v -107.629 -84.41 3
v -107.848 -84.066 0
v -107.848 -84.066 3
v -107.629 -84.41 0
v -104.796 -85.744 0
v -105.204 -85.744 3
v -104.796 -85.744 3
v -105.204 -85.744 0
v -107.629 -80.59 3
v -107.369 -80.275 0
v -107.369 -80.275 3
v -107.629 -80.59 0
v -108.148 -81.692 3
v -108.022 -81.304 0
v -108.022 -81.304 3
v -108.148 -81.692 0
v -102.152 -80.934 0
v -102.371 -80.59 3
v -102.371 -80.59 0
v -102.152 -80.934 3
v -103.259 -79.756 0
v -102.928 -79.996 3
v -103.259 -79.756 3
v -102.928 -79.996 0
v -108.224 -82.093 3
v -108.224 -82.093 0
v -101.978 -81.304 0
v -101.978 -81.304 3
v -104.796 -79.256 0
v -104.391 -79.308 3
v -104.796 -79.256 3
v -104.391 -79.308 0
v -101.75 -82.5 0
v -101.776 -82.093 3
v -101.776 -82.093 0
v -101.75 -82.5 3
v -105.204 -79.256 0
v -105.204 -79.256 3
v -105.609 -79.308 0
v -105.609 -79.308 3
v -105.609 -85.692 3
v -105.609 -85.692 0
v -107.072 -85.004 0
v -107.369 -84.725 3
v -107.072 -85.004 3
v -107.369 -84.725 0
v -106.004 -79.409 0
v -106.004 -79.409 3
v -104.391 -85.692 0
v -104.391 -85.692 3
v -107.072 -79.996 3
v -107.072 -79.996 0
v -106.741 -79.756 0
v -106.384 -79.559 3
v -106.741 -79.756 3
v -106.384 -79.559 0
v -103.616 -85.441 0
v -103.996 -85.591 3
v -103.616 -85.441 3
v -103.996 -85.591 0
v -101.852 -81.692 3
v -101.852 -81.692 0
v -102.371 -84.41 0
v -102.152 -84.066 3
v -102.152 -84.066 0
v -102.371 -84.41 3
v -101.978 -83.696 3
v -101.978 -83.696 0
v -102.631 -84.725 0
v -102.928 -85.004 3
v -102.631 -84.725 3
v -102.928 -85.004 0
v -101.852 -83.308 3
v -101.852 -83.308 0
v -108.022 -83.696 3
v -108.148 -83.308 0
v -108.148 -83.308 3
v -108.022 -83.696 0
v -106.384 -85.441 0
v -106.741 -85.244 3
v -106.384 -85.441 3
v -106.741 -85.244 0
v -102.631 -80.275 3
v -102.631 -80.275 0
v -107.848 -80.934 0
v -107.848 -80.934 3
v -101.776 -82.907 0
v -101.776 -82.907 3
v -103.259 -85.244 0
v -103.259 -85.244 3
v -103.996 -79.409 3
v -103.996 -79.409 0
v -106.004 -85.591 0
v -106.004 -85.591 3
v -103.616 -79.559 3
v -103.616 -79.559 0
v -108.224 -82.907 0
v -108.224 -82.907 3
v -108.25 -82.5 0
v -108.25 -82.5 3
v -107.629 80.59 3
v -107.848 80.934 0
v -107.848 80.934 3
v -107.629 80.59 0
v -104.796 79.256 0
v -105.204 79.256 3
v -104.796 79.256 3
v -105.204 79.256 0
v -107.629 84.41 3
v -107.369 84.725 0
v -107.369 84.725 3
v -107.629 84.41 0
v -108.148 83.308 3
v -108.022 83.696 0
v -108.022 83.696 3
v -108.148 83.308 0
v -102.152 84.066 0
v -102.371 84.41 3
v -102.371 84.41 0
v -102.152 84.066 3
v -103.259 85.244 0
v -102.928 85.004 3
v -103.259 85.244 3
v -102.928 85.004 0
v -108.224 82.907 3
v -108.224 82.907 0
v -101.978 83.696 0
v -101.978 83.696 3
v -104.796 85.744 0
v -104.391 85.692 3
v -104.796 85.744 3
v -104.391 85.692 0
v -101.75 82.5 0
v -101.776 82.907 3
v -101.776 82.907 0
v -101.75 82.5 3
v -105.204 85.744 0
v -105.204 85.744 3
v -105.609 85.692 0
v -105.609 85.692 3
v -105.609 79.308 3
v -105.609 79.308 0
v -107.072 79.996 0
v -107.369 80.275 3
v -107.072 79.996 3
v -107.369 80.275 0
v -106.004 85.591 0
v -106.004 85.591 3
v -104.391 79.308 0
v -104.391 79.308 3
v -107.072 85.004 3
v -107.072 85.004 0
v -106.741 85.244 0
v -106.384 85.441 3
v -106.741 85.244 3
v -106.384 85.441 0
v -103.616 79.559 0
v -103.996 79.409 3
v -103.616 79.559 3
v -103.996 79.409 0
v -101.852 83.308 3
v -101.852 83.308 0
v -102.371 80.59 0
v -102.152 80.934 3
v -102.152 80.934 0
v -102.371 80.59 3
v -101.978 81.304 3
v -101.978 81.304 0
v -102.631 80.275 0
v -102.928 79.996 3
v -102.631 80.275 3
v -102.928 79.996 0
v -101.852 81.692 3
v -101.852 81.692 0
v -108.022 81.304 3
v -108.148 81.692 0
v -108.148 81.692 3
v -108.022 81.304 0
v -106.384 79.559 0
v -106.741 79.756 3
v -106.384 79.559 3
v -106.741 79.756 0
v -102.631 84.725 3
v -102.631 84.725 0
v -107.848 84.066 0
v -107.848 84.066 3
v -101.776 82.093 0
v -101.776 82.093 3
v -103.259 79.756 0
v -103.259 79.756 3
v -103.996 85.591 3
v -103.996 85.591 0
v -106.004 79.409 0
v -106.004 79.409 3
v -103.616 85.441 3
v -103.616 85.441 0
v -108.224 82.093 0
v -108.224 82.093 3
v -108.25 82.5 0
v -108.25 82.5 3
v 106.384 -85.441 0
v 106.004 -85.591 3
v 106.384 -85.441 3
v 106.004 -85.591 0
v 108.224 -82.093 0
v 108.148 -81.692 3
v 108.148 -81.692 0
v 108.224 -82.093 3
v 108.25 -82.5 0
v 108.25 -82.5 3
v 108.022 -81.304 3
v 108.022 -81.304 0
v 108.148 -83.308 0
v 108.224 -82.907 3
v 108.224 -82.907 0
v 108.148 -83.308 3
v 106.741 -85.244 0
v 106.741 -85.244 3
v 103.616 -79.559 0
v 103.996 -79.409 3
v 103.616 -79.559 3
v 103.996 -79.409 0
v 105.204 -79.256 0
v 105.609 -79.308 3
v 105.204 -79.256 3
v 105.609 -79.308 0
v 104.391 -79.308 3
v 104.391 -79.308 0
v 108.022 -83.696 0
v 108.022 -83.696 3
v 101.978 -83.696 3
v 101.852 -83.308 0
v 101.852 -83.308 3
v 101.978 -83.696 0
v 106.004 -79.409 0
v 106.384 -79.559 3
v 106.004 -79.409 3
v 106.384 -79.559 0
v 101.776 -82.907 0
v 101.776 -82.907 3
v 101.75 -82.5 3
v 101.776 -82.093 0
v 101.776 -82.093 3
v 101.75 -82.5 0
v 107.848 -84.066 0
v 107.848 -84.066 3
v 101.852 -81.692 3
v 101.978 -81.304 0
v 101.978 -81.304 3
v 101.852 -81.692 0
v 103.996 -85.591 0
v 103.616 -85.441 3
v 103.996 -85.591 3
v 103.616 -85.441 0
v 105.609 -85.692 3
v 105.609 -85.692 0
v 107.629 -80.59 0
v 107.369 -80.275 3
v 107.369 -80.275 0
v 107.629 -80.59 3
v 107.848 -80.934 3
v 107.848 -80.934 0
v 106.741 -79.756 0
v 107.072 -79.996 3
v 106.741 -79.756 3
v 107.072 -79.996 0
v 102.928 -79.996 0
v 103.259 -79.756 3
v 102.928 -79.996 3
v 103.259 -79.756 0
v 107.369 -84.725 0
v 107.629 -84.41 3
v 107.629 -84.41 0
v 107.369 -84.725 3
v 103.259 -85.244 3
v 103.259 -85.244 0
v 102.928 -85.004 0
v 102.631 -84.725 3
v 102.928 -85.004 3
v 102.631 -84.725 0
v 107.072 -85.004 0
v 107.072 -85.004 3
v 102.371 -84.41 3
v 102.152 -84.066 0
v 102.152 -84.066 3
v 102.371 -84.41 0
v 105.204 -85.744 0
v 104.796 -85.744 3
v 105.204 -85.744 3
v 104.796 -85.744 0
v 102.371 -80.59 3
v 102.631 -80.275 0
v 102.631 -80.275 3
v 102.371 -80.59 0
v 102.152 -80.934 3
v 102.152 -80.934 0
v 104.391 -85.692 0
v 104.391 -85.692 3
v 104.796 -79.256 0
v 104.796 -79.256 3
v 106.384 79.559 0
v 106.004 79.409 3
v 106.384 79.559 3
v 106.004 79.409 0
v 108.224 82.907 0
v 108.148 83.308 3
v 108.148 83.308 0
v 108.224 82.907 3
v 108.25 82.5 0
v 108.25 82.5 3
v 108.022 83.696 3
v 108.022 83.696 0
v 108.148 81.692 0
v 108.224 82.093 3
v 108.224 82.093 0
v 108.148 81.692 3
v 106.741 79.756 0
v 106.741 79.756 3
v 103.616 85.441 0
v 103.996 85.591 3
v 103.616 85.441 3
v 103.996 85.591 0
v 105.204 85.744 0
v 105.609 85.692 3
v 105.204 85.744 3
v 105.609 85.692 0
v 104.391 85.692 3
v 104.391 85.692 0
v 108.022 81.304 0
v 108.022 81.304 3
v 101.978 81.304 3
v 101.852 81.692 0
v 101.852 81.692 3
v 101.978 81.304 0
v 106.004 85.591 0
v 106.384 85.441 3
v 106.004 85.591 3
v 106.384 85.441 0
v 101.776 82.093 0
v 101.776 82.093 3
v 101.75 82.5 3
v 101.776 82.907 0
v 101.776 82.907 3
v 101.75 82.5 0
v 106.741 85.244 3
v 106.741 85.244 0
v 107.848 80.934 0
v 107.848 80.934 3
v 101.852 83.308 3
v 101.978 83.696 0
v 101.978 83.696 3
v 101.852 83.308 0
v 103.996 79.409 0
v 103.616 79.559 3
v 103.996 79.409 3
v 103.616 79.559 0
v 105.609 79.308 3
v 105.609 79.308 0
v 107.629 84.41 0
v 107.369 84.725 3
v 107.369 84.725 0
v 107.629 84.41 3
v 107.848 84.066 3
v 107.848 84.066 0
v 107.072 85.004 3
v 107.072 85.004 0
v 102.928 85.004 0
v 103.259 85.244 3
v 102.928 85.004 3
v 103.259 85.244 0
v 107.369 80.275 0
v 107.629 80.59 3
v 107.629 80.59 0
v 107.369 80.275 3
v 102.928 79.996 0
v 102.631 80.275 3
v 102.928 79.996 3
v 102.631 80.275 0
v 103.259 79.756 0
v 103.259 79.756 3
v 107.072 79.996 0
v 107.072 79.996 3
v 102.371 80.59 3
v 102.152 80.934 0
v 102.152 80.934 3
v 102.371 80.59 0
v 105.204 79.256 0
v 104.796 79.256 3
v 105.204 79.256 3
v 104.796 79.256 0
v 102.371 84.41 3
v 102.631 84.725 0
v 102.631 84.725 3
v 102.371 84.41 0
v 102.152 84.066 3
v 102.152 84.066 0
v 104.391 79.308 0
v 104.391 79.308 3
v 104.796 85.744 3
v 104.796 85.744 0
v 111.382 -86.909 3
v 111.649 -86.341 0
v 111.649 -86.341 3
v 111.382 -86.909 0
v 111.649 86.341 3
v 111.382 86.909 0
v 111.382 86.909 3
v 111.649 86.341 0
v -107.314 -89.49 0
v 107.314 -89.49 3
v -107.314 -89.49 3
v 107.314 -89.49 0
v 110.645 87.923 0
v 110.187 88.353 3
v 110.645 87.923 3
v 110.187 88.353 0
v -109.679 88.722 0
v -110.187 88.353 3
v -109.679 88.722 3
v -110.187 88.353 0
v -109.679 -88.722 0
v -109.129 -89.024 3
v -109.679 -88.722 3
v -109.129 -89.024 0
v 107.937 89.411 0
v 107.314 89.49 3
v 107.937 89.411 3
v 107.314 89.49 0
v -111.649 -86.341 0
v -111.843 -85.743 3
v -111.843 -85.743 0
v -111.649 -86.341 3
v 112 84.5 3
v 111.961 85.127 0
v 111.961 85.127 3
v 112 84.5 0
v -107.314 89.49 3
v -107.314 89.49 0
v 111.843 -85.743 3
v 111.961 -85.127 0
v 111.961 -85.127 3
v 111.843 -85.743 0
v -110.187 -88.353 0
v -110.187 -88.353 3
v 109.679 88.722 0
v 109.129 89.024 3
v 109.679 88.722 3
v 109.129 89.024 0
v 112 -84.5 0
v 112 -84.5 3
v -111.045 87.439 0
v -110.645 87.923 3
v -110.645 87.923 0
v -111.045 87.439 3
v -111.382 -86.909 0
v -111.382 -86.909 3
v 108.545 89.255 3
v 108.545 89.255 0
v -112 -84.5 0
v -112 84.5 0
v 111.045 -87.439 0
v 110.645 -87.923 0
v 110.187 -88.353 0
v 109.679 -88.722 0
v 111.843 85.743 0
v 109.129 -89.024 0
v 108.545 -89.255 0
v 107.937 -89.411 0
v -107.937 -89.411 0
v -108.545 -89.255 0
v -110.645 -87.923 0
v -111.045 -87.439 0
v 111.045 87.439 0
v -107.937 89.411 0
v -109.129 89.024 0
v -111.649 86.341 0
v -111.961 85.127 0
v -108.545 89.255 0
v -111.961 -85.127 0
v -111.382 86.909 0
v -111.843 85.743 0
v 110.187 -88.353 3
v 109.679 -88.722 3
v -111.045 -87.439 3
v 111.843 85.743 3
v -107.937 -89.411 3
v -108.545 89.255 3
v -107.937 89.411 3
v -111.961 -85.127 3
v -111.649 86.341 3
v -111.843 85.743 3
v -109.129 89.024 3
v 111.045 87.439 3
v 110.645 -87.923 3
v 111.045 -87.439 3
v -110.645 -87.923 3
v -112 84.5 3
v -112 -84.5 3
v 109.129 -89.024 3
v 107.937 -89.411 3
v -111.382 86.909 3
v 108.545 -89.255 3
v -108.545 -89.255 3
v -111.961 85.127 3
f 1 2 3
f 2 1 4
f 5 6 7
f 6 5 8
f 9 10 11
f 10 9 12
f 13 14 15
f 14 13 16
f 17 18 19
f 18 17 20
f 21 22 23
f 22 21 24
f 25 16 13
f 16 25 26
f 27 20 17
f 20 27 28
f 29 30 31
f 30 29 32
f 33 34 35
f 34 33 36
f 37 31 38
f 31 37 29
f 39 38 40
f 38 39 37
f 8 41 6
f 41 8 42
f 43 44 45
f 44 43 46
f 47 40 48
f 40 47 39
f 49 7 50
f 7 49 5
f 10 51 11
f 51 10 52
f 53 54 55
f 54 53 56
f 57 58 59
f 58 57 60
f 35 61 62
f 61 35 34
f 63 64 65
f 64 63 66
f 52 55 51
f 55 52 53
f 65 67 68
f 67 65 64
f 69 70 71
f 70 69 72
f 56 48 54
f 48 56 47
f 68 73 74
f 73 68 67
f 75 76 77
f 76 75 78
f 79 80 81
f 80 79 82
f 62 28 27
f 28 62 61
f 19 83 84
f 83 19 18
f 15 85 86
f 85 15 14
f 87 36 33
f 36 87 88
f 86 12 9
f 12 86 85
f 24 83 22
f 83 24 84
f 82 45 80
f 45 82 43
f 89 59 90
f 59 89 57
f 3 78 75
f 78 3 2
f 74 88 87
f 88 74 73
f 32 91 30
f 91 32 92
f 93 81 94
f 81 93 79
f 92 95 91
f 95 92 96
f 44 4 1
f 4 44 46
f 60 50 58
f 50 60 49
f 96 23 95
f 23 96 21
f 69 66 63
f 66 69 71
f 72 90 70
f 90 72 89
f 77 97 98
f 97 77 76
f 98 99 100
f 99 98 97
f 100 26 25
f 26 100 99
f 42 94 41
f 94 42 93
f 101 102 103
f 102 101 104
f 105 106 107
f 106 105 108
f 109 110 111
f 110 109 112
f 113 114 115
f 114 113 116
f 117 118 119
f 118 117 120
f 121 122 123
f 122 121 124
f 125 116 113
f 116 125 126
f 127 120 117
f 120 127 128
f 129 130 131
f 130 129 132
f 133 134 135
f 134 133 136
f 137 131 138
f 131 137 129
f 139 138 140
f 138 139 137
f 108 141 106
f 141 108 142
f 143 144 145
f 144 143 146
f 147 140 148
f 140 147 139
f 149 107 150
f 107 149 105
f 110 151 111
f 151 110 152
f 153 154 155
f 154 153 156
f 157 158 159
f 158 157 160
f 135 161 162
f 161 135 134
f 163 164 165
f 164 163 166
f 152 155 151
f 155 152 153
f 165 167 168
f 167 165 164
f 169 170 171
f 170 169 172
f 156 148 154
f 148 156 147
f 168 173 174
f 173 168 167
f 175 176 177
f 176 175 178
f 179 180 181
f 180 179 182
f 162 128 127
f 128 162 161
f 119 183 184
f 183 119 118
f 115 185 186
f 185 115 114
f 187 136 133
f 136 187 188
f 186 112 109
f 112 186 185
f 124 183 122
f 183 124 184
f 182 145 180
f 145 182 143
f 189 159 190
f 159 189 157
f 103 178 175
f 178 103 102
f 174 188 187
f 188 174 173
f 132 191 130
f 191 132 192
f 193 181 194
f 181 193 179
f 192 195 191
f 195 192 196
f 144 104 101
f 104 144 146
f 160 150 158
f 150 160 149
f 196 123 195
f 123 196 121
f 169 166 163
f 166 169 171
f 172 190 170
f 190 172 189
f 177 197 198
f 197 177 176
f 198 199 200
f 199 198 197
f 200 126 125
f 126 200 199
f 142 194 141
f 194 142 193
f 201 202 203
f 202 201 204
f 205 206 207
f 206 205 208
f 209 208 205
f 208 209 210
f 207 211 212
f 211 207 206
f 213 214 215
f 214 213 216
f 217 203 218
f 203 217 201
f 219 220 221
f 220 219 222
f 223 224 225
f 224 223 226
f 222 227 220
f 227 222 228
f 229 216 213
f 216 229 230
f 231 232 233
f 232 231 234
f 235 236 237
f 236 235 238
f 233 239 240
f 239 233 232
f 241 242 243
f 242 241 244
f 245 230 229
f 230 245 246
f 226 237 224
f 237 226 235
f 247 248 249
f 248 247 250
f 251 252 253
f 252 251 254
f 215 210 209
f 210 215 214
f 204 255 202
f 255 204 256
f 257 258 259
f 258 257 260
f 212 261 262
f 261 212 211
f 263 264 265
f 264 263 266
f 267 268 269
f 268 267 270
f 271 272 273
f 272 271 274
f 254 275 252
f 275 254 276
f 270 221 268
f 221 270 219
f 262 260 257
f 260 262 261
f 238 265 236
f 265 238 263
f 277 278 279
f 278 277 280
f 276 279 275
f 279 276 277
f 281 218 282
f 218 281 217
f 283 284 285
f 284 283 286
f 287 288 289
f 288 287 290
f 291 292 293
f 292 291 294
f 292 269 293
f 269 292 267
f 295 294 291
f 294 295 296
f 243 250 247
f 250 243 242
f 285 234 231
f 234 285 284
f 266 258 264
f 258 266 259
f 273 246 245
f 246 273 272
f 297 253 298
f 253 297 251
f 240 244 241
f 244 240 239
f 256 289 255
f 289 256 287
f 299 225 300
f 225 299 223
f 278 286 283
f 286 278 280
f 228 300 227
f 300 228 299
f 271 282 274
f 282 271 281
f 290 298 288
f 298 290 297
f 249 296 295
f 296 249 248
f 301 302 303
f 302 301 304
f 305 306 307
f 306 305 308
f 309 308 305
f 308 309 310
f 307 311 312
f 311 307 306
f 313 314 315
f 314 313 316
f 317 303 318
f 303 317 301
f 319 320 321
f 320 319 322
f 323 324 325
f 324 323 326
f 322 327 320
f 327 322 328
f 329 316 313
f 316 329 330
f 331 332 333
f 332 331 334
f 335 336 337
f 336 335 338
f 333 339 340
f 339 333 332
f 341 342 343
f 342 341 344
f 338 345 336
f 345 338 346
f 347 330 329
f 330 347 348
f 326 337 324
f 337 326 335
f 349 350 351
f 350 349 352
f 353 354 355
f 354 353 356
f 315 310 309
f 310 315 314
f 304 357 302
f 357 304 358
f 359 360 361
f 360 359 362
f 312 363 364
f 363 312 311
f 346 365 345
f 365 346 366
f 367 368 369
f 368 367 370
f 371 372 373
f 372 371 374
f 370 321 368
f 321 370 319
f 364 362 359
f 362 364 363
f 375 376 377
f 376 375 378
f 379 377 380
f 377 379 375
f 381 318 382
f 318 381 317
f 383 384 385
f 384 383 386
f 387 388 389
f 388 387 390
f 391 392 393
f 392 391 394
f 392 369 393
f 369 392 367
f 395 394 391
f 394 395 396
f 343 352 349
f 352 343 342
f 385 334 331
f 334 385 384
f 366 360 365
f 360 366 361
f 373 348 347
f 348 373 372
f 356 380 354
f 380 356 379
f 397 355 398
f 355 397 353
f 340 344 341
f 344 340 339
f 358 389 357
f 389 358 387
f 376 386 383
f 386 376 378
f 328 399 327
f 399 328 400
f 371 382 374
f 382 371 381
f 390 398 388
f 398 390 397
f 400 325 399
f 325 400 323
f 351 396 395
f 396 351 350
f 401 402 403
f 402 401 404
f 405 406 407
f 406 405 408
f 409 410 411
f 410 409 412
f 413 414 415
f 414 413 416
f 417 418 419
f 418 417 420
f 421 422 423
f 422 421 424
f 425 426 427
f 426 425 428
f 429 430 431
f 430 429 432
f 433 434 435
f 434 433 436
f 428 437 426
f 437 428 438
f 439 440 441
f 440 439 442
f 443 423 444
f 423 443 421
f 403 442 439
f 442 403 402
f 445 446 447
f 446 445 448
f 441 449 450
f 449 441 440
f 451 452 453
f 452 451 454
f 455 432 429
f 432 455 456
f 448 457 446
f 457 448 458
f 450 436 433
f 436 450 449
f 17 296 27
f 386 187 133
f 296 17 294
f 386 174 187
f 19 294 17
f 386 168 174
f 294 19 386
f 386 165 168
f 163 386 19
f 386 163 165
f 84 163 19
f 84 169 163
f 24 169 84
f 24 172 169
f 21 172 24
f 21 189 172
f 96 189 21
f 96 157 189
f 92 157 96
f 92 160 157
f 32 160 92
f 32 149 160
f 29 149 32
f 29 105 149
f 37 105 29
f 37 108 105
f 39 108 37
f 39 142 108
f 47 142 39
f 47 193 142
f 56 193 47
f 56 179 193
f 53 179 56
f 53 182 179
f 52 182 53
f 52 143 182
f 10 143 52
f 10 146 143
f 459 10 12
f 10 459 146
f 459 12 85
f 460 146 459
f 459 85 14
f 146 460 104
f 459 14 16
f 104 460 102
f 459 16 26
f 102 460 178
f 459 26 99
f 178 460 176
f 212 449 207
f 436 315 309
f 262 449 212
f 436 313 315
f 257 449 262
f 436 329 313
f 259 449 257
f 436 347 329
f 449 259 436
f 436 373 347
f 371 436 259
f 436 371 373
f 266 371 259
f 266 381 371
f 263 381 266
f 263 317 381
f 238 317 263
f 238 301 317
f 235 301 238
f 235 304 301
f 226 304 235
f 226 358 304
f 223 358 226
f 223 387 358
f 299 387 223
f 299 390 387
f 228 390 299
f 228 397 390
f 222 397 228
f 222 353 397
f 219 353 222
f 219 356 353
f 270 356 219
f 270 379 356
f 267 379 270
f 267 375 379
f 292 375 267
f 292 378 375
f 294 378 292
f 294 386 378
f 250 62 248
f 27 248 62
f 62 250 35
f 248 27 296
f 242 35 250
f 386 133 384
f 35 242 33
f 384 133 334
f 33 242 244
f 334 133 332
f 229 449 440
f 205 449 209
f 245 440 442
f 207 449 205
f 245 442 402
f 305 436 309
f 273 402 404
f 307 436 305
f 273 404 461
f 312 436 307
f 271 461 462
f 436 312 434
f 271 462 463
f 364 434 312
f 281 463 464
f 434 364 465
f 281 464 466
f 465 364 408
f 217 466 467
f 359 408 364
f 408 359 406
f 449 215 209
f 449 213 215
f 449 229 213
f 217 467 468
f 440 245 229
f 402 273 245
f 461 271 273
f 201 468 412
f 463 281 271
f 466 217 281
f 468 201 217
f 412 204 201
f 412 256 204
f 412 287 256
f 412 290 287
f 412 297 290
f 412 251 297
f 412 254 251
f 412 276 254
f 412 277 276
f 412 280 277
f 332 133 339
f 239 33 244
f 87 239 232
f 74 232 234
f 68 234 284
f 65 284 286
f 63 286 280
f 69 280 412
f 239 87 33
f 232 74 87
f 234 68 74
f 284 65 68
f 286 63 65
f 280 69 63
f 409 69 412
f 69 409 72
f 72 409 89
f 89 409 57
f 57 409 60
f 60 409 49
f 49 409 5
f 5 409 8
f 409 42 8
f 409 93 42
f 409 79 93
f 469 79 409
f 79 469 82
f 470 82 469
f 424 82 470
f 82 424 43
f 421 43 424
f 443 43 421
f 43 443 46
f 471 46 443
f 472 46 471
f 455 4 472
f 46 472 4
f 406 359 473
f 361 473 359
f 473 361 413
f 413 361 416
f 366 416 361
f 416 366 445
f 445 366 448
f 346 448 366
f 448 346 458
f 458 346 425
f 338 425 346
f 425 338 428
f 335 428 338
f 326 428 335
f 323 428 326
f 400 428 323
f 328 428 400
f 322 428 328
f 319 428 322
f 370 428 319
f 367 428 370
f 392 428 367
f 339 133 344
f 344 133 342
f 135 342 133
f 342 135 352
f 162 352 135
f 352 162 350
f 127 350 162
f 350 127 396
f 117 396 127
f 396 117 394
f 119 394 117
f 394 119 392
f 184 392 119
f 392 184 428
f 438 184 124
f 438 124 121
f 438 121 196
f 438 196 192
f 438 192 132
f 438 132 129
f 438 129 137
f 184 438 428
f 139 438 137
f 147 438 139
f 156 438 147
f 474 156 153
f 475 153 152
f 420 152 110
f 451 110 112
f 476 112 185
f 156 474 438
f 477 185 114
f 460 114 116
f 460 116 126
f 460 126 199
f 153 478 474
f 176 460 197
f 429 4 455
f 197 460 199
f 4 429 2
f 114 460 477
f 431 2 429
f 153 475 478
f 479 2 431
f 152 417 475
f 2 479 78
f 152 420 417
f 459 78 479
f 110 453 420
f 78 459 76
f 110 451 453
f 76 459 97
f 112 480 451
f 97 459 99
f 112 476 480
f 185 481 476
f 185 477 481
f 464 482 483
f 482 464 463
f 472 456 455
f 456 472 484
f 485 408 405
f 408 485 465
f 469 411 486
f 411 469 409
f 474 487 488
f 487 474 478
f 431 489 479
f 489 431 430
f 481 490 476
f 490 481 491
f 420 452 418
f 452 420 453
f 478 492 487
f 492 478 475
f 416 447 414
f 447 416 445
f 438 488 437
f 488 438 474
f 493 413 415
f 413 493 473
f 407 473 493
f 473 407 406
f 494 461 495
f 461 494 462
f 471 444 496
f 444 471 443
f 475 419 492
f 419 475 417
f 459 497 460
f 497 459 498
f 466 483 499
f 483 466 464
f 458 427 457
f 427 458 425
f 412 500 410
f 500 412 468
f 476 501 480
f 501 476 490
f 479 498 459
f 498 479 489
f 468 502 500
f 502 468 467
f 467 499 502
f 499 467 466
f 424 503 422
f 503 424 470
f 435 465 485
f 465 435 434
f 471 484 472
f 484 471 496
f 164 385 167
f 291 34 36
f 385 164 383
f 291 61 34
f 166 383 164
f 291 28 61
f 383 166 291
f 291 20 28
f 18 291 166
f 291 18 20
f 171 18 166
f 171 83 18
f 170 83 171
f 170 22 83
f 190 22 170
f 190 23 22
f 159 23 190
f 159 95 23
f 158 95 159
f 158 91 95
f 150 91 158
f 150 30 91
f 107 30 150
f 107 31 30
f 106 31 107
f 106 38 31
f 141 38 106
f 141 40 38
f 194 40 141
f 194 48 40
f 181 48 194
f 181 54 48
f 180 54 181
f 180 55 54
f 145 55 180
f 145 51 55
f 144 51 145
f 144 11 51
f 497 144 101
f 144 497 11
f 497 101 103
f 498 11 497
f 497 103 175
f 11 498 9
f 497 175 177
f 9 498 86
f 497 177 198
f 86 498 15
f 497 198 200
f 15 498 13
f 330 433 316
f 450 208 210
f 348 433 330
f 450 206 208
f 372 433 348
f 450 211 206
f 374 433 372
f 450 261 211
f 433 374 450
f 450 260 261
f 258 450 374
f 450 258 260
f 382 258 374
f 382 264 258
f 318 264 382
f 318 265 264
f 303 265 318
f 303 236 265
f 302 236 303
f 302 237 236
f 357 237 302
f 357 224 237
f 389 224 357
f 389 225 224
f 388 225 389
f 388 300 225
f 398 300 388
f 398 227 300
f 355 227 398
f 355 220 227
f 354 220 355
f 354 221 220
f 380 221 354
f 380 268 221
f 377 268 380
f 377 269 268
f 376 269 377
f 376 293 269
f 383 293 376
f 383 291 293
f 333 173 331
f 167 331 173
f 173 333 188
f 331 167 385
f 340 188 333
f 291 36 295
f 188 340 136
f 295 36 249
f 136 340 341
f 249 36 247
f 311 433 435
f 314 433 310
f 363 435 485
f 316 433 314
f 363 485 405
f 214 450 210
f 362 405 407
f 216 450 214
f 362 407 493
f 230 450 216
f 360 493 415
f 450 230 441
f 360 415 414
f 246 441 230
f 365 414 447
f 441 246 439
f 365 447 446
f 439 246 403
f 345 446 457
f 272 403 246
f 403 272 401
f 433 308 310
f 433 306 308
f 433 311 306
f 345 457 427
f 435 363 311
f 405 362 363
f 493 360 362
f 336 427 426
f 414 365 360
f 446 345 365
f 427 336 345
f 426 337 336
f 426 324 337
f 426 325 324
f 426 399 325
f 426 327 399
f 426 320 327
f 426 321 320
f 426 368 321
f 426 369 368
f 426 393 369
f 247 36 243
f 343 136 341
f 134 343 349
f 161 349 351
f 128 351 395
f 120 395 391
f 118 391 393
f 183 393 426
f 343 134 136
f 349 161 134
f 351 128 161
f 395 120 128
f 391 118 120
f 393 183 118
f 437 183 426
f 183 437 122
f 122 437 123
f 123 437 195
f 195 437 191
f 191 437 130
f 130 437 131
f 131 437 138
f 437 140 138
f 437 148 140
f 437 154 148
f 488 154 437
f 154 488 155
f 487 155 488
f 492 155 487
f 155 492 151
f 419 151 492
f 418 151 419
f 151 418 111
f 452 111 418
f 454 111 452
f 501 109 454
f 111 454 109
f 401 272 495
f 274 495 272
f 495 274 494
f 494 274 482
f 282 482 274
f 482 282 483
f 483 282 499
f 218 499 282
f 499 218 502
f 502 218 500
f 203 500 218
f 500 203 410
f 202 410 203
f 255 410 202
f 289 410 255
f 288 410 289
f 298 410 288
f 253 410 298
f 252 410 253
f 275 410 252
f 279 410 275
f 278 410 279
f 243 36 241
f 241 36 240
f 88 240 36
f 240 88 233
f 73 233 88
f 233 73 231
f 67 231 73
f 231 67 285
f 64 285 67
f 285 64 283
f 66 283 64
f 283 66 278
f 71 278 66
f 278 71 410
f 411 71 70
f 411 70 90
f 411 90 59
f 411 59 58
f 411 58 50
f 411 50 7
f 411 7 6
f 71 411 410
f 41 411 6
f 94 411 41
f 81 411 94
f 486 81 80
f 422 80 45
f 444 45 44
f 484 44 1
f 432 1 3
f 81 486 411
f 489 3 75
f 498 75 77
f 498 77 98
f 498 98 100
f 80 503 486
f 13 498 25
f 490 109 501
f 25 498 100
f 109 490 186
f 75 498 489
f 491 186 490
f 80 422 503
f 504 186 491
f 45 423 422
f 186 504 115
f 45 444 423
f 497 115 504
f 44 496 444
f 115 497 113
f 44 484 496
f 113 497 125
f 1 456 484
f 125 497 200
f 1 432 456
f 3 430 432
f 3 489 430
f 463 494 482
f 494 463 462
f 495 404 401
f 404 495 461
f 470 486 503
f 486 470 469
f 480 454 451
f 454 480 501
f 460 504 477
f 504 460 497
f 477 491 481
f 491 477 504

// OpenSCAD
$fn = 50;


difference() {
	union() {
		hull() {
			translate(v = [-107.0000000000, 84.5000000000, 0]) {
				cylinder(h = 3, r = 5);
			}
			translate(v = [107.0000000000, 84.5000000000, 0]) {
				cylinder(h = 3, r = 5);
			}
			translate(v = [-107.0000000000, -84.5000000000, 0]) {
				cylinder(h = 3, r = 5);
			}
			translate(v = [107.0000000000, -84.5000000000, 0]) {
				cylinder(h = 3, r = 5);
			}
		}
	}
	union() {
		translate(v = [-105.0000000000, -82.5000000000, -100.0000000000]) {
			cylinder(h = 200, r = 3.2500000000);
		}
		translate(v = [-105.0000000000, 82.5000000000, -100.0000000000]) {
			cylinder(h = 200, r = 3.2500000000);
		}
		translate(v = [105.0000000000, -82.5000000000, -100.0000000000]) {
			cylinder(h = 200, r = 3.2500000000);
		}
		translate(v = [105.0000000000, 82.5000000000, -100.0000000000]) {
			cylinder(h = 200, r = 3.2500000000);
		}
	}
}
